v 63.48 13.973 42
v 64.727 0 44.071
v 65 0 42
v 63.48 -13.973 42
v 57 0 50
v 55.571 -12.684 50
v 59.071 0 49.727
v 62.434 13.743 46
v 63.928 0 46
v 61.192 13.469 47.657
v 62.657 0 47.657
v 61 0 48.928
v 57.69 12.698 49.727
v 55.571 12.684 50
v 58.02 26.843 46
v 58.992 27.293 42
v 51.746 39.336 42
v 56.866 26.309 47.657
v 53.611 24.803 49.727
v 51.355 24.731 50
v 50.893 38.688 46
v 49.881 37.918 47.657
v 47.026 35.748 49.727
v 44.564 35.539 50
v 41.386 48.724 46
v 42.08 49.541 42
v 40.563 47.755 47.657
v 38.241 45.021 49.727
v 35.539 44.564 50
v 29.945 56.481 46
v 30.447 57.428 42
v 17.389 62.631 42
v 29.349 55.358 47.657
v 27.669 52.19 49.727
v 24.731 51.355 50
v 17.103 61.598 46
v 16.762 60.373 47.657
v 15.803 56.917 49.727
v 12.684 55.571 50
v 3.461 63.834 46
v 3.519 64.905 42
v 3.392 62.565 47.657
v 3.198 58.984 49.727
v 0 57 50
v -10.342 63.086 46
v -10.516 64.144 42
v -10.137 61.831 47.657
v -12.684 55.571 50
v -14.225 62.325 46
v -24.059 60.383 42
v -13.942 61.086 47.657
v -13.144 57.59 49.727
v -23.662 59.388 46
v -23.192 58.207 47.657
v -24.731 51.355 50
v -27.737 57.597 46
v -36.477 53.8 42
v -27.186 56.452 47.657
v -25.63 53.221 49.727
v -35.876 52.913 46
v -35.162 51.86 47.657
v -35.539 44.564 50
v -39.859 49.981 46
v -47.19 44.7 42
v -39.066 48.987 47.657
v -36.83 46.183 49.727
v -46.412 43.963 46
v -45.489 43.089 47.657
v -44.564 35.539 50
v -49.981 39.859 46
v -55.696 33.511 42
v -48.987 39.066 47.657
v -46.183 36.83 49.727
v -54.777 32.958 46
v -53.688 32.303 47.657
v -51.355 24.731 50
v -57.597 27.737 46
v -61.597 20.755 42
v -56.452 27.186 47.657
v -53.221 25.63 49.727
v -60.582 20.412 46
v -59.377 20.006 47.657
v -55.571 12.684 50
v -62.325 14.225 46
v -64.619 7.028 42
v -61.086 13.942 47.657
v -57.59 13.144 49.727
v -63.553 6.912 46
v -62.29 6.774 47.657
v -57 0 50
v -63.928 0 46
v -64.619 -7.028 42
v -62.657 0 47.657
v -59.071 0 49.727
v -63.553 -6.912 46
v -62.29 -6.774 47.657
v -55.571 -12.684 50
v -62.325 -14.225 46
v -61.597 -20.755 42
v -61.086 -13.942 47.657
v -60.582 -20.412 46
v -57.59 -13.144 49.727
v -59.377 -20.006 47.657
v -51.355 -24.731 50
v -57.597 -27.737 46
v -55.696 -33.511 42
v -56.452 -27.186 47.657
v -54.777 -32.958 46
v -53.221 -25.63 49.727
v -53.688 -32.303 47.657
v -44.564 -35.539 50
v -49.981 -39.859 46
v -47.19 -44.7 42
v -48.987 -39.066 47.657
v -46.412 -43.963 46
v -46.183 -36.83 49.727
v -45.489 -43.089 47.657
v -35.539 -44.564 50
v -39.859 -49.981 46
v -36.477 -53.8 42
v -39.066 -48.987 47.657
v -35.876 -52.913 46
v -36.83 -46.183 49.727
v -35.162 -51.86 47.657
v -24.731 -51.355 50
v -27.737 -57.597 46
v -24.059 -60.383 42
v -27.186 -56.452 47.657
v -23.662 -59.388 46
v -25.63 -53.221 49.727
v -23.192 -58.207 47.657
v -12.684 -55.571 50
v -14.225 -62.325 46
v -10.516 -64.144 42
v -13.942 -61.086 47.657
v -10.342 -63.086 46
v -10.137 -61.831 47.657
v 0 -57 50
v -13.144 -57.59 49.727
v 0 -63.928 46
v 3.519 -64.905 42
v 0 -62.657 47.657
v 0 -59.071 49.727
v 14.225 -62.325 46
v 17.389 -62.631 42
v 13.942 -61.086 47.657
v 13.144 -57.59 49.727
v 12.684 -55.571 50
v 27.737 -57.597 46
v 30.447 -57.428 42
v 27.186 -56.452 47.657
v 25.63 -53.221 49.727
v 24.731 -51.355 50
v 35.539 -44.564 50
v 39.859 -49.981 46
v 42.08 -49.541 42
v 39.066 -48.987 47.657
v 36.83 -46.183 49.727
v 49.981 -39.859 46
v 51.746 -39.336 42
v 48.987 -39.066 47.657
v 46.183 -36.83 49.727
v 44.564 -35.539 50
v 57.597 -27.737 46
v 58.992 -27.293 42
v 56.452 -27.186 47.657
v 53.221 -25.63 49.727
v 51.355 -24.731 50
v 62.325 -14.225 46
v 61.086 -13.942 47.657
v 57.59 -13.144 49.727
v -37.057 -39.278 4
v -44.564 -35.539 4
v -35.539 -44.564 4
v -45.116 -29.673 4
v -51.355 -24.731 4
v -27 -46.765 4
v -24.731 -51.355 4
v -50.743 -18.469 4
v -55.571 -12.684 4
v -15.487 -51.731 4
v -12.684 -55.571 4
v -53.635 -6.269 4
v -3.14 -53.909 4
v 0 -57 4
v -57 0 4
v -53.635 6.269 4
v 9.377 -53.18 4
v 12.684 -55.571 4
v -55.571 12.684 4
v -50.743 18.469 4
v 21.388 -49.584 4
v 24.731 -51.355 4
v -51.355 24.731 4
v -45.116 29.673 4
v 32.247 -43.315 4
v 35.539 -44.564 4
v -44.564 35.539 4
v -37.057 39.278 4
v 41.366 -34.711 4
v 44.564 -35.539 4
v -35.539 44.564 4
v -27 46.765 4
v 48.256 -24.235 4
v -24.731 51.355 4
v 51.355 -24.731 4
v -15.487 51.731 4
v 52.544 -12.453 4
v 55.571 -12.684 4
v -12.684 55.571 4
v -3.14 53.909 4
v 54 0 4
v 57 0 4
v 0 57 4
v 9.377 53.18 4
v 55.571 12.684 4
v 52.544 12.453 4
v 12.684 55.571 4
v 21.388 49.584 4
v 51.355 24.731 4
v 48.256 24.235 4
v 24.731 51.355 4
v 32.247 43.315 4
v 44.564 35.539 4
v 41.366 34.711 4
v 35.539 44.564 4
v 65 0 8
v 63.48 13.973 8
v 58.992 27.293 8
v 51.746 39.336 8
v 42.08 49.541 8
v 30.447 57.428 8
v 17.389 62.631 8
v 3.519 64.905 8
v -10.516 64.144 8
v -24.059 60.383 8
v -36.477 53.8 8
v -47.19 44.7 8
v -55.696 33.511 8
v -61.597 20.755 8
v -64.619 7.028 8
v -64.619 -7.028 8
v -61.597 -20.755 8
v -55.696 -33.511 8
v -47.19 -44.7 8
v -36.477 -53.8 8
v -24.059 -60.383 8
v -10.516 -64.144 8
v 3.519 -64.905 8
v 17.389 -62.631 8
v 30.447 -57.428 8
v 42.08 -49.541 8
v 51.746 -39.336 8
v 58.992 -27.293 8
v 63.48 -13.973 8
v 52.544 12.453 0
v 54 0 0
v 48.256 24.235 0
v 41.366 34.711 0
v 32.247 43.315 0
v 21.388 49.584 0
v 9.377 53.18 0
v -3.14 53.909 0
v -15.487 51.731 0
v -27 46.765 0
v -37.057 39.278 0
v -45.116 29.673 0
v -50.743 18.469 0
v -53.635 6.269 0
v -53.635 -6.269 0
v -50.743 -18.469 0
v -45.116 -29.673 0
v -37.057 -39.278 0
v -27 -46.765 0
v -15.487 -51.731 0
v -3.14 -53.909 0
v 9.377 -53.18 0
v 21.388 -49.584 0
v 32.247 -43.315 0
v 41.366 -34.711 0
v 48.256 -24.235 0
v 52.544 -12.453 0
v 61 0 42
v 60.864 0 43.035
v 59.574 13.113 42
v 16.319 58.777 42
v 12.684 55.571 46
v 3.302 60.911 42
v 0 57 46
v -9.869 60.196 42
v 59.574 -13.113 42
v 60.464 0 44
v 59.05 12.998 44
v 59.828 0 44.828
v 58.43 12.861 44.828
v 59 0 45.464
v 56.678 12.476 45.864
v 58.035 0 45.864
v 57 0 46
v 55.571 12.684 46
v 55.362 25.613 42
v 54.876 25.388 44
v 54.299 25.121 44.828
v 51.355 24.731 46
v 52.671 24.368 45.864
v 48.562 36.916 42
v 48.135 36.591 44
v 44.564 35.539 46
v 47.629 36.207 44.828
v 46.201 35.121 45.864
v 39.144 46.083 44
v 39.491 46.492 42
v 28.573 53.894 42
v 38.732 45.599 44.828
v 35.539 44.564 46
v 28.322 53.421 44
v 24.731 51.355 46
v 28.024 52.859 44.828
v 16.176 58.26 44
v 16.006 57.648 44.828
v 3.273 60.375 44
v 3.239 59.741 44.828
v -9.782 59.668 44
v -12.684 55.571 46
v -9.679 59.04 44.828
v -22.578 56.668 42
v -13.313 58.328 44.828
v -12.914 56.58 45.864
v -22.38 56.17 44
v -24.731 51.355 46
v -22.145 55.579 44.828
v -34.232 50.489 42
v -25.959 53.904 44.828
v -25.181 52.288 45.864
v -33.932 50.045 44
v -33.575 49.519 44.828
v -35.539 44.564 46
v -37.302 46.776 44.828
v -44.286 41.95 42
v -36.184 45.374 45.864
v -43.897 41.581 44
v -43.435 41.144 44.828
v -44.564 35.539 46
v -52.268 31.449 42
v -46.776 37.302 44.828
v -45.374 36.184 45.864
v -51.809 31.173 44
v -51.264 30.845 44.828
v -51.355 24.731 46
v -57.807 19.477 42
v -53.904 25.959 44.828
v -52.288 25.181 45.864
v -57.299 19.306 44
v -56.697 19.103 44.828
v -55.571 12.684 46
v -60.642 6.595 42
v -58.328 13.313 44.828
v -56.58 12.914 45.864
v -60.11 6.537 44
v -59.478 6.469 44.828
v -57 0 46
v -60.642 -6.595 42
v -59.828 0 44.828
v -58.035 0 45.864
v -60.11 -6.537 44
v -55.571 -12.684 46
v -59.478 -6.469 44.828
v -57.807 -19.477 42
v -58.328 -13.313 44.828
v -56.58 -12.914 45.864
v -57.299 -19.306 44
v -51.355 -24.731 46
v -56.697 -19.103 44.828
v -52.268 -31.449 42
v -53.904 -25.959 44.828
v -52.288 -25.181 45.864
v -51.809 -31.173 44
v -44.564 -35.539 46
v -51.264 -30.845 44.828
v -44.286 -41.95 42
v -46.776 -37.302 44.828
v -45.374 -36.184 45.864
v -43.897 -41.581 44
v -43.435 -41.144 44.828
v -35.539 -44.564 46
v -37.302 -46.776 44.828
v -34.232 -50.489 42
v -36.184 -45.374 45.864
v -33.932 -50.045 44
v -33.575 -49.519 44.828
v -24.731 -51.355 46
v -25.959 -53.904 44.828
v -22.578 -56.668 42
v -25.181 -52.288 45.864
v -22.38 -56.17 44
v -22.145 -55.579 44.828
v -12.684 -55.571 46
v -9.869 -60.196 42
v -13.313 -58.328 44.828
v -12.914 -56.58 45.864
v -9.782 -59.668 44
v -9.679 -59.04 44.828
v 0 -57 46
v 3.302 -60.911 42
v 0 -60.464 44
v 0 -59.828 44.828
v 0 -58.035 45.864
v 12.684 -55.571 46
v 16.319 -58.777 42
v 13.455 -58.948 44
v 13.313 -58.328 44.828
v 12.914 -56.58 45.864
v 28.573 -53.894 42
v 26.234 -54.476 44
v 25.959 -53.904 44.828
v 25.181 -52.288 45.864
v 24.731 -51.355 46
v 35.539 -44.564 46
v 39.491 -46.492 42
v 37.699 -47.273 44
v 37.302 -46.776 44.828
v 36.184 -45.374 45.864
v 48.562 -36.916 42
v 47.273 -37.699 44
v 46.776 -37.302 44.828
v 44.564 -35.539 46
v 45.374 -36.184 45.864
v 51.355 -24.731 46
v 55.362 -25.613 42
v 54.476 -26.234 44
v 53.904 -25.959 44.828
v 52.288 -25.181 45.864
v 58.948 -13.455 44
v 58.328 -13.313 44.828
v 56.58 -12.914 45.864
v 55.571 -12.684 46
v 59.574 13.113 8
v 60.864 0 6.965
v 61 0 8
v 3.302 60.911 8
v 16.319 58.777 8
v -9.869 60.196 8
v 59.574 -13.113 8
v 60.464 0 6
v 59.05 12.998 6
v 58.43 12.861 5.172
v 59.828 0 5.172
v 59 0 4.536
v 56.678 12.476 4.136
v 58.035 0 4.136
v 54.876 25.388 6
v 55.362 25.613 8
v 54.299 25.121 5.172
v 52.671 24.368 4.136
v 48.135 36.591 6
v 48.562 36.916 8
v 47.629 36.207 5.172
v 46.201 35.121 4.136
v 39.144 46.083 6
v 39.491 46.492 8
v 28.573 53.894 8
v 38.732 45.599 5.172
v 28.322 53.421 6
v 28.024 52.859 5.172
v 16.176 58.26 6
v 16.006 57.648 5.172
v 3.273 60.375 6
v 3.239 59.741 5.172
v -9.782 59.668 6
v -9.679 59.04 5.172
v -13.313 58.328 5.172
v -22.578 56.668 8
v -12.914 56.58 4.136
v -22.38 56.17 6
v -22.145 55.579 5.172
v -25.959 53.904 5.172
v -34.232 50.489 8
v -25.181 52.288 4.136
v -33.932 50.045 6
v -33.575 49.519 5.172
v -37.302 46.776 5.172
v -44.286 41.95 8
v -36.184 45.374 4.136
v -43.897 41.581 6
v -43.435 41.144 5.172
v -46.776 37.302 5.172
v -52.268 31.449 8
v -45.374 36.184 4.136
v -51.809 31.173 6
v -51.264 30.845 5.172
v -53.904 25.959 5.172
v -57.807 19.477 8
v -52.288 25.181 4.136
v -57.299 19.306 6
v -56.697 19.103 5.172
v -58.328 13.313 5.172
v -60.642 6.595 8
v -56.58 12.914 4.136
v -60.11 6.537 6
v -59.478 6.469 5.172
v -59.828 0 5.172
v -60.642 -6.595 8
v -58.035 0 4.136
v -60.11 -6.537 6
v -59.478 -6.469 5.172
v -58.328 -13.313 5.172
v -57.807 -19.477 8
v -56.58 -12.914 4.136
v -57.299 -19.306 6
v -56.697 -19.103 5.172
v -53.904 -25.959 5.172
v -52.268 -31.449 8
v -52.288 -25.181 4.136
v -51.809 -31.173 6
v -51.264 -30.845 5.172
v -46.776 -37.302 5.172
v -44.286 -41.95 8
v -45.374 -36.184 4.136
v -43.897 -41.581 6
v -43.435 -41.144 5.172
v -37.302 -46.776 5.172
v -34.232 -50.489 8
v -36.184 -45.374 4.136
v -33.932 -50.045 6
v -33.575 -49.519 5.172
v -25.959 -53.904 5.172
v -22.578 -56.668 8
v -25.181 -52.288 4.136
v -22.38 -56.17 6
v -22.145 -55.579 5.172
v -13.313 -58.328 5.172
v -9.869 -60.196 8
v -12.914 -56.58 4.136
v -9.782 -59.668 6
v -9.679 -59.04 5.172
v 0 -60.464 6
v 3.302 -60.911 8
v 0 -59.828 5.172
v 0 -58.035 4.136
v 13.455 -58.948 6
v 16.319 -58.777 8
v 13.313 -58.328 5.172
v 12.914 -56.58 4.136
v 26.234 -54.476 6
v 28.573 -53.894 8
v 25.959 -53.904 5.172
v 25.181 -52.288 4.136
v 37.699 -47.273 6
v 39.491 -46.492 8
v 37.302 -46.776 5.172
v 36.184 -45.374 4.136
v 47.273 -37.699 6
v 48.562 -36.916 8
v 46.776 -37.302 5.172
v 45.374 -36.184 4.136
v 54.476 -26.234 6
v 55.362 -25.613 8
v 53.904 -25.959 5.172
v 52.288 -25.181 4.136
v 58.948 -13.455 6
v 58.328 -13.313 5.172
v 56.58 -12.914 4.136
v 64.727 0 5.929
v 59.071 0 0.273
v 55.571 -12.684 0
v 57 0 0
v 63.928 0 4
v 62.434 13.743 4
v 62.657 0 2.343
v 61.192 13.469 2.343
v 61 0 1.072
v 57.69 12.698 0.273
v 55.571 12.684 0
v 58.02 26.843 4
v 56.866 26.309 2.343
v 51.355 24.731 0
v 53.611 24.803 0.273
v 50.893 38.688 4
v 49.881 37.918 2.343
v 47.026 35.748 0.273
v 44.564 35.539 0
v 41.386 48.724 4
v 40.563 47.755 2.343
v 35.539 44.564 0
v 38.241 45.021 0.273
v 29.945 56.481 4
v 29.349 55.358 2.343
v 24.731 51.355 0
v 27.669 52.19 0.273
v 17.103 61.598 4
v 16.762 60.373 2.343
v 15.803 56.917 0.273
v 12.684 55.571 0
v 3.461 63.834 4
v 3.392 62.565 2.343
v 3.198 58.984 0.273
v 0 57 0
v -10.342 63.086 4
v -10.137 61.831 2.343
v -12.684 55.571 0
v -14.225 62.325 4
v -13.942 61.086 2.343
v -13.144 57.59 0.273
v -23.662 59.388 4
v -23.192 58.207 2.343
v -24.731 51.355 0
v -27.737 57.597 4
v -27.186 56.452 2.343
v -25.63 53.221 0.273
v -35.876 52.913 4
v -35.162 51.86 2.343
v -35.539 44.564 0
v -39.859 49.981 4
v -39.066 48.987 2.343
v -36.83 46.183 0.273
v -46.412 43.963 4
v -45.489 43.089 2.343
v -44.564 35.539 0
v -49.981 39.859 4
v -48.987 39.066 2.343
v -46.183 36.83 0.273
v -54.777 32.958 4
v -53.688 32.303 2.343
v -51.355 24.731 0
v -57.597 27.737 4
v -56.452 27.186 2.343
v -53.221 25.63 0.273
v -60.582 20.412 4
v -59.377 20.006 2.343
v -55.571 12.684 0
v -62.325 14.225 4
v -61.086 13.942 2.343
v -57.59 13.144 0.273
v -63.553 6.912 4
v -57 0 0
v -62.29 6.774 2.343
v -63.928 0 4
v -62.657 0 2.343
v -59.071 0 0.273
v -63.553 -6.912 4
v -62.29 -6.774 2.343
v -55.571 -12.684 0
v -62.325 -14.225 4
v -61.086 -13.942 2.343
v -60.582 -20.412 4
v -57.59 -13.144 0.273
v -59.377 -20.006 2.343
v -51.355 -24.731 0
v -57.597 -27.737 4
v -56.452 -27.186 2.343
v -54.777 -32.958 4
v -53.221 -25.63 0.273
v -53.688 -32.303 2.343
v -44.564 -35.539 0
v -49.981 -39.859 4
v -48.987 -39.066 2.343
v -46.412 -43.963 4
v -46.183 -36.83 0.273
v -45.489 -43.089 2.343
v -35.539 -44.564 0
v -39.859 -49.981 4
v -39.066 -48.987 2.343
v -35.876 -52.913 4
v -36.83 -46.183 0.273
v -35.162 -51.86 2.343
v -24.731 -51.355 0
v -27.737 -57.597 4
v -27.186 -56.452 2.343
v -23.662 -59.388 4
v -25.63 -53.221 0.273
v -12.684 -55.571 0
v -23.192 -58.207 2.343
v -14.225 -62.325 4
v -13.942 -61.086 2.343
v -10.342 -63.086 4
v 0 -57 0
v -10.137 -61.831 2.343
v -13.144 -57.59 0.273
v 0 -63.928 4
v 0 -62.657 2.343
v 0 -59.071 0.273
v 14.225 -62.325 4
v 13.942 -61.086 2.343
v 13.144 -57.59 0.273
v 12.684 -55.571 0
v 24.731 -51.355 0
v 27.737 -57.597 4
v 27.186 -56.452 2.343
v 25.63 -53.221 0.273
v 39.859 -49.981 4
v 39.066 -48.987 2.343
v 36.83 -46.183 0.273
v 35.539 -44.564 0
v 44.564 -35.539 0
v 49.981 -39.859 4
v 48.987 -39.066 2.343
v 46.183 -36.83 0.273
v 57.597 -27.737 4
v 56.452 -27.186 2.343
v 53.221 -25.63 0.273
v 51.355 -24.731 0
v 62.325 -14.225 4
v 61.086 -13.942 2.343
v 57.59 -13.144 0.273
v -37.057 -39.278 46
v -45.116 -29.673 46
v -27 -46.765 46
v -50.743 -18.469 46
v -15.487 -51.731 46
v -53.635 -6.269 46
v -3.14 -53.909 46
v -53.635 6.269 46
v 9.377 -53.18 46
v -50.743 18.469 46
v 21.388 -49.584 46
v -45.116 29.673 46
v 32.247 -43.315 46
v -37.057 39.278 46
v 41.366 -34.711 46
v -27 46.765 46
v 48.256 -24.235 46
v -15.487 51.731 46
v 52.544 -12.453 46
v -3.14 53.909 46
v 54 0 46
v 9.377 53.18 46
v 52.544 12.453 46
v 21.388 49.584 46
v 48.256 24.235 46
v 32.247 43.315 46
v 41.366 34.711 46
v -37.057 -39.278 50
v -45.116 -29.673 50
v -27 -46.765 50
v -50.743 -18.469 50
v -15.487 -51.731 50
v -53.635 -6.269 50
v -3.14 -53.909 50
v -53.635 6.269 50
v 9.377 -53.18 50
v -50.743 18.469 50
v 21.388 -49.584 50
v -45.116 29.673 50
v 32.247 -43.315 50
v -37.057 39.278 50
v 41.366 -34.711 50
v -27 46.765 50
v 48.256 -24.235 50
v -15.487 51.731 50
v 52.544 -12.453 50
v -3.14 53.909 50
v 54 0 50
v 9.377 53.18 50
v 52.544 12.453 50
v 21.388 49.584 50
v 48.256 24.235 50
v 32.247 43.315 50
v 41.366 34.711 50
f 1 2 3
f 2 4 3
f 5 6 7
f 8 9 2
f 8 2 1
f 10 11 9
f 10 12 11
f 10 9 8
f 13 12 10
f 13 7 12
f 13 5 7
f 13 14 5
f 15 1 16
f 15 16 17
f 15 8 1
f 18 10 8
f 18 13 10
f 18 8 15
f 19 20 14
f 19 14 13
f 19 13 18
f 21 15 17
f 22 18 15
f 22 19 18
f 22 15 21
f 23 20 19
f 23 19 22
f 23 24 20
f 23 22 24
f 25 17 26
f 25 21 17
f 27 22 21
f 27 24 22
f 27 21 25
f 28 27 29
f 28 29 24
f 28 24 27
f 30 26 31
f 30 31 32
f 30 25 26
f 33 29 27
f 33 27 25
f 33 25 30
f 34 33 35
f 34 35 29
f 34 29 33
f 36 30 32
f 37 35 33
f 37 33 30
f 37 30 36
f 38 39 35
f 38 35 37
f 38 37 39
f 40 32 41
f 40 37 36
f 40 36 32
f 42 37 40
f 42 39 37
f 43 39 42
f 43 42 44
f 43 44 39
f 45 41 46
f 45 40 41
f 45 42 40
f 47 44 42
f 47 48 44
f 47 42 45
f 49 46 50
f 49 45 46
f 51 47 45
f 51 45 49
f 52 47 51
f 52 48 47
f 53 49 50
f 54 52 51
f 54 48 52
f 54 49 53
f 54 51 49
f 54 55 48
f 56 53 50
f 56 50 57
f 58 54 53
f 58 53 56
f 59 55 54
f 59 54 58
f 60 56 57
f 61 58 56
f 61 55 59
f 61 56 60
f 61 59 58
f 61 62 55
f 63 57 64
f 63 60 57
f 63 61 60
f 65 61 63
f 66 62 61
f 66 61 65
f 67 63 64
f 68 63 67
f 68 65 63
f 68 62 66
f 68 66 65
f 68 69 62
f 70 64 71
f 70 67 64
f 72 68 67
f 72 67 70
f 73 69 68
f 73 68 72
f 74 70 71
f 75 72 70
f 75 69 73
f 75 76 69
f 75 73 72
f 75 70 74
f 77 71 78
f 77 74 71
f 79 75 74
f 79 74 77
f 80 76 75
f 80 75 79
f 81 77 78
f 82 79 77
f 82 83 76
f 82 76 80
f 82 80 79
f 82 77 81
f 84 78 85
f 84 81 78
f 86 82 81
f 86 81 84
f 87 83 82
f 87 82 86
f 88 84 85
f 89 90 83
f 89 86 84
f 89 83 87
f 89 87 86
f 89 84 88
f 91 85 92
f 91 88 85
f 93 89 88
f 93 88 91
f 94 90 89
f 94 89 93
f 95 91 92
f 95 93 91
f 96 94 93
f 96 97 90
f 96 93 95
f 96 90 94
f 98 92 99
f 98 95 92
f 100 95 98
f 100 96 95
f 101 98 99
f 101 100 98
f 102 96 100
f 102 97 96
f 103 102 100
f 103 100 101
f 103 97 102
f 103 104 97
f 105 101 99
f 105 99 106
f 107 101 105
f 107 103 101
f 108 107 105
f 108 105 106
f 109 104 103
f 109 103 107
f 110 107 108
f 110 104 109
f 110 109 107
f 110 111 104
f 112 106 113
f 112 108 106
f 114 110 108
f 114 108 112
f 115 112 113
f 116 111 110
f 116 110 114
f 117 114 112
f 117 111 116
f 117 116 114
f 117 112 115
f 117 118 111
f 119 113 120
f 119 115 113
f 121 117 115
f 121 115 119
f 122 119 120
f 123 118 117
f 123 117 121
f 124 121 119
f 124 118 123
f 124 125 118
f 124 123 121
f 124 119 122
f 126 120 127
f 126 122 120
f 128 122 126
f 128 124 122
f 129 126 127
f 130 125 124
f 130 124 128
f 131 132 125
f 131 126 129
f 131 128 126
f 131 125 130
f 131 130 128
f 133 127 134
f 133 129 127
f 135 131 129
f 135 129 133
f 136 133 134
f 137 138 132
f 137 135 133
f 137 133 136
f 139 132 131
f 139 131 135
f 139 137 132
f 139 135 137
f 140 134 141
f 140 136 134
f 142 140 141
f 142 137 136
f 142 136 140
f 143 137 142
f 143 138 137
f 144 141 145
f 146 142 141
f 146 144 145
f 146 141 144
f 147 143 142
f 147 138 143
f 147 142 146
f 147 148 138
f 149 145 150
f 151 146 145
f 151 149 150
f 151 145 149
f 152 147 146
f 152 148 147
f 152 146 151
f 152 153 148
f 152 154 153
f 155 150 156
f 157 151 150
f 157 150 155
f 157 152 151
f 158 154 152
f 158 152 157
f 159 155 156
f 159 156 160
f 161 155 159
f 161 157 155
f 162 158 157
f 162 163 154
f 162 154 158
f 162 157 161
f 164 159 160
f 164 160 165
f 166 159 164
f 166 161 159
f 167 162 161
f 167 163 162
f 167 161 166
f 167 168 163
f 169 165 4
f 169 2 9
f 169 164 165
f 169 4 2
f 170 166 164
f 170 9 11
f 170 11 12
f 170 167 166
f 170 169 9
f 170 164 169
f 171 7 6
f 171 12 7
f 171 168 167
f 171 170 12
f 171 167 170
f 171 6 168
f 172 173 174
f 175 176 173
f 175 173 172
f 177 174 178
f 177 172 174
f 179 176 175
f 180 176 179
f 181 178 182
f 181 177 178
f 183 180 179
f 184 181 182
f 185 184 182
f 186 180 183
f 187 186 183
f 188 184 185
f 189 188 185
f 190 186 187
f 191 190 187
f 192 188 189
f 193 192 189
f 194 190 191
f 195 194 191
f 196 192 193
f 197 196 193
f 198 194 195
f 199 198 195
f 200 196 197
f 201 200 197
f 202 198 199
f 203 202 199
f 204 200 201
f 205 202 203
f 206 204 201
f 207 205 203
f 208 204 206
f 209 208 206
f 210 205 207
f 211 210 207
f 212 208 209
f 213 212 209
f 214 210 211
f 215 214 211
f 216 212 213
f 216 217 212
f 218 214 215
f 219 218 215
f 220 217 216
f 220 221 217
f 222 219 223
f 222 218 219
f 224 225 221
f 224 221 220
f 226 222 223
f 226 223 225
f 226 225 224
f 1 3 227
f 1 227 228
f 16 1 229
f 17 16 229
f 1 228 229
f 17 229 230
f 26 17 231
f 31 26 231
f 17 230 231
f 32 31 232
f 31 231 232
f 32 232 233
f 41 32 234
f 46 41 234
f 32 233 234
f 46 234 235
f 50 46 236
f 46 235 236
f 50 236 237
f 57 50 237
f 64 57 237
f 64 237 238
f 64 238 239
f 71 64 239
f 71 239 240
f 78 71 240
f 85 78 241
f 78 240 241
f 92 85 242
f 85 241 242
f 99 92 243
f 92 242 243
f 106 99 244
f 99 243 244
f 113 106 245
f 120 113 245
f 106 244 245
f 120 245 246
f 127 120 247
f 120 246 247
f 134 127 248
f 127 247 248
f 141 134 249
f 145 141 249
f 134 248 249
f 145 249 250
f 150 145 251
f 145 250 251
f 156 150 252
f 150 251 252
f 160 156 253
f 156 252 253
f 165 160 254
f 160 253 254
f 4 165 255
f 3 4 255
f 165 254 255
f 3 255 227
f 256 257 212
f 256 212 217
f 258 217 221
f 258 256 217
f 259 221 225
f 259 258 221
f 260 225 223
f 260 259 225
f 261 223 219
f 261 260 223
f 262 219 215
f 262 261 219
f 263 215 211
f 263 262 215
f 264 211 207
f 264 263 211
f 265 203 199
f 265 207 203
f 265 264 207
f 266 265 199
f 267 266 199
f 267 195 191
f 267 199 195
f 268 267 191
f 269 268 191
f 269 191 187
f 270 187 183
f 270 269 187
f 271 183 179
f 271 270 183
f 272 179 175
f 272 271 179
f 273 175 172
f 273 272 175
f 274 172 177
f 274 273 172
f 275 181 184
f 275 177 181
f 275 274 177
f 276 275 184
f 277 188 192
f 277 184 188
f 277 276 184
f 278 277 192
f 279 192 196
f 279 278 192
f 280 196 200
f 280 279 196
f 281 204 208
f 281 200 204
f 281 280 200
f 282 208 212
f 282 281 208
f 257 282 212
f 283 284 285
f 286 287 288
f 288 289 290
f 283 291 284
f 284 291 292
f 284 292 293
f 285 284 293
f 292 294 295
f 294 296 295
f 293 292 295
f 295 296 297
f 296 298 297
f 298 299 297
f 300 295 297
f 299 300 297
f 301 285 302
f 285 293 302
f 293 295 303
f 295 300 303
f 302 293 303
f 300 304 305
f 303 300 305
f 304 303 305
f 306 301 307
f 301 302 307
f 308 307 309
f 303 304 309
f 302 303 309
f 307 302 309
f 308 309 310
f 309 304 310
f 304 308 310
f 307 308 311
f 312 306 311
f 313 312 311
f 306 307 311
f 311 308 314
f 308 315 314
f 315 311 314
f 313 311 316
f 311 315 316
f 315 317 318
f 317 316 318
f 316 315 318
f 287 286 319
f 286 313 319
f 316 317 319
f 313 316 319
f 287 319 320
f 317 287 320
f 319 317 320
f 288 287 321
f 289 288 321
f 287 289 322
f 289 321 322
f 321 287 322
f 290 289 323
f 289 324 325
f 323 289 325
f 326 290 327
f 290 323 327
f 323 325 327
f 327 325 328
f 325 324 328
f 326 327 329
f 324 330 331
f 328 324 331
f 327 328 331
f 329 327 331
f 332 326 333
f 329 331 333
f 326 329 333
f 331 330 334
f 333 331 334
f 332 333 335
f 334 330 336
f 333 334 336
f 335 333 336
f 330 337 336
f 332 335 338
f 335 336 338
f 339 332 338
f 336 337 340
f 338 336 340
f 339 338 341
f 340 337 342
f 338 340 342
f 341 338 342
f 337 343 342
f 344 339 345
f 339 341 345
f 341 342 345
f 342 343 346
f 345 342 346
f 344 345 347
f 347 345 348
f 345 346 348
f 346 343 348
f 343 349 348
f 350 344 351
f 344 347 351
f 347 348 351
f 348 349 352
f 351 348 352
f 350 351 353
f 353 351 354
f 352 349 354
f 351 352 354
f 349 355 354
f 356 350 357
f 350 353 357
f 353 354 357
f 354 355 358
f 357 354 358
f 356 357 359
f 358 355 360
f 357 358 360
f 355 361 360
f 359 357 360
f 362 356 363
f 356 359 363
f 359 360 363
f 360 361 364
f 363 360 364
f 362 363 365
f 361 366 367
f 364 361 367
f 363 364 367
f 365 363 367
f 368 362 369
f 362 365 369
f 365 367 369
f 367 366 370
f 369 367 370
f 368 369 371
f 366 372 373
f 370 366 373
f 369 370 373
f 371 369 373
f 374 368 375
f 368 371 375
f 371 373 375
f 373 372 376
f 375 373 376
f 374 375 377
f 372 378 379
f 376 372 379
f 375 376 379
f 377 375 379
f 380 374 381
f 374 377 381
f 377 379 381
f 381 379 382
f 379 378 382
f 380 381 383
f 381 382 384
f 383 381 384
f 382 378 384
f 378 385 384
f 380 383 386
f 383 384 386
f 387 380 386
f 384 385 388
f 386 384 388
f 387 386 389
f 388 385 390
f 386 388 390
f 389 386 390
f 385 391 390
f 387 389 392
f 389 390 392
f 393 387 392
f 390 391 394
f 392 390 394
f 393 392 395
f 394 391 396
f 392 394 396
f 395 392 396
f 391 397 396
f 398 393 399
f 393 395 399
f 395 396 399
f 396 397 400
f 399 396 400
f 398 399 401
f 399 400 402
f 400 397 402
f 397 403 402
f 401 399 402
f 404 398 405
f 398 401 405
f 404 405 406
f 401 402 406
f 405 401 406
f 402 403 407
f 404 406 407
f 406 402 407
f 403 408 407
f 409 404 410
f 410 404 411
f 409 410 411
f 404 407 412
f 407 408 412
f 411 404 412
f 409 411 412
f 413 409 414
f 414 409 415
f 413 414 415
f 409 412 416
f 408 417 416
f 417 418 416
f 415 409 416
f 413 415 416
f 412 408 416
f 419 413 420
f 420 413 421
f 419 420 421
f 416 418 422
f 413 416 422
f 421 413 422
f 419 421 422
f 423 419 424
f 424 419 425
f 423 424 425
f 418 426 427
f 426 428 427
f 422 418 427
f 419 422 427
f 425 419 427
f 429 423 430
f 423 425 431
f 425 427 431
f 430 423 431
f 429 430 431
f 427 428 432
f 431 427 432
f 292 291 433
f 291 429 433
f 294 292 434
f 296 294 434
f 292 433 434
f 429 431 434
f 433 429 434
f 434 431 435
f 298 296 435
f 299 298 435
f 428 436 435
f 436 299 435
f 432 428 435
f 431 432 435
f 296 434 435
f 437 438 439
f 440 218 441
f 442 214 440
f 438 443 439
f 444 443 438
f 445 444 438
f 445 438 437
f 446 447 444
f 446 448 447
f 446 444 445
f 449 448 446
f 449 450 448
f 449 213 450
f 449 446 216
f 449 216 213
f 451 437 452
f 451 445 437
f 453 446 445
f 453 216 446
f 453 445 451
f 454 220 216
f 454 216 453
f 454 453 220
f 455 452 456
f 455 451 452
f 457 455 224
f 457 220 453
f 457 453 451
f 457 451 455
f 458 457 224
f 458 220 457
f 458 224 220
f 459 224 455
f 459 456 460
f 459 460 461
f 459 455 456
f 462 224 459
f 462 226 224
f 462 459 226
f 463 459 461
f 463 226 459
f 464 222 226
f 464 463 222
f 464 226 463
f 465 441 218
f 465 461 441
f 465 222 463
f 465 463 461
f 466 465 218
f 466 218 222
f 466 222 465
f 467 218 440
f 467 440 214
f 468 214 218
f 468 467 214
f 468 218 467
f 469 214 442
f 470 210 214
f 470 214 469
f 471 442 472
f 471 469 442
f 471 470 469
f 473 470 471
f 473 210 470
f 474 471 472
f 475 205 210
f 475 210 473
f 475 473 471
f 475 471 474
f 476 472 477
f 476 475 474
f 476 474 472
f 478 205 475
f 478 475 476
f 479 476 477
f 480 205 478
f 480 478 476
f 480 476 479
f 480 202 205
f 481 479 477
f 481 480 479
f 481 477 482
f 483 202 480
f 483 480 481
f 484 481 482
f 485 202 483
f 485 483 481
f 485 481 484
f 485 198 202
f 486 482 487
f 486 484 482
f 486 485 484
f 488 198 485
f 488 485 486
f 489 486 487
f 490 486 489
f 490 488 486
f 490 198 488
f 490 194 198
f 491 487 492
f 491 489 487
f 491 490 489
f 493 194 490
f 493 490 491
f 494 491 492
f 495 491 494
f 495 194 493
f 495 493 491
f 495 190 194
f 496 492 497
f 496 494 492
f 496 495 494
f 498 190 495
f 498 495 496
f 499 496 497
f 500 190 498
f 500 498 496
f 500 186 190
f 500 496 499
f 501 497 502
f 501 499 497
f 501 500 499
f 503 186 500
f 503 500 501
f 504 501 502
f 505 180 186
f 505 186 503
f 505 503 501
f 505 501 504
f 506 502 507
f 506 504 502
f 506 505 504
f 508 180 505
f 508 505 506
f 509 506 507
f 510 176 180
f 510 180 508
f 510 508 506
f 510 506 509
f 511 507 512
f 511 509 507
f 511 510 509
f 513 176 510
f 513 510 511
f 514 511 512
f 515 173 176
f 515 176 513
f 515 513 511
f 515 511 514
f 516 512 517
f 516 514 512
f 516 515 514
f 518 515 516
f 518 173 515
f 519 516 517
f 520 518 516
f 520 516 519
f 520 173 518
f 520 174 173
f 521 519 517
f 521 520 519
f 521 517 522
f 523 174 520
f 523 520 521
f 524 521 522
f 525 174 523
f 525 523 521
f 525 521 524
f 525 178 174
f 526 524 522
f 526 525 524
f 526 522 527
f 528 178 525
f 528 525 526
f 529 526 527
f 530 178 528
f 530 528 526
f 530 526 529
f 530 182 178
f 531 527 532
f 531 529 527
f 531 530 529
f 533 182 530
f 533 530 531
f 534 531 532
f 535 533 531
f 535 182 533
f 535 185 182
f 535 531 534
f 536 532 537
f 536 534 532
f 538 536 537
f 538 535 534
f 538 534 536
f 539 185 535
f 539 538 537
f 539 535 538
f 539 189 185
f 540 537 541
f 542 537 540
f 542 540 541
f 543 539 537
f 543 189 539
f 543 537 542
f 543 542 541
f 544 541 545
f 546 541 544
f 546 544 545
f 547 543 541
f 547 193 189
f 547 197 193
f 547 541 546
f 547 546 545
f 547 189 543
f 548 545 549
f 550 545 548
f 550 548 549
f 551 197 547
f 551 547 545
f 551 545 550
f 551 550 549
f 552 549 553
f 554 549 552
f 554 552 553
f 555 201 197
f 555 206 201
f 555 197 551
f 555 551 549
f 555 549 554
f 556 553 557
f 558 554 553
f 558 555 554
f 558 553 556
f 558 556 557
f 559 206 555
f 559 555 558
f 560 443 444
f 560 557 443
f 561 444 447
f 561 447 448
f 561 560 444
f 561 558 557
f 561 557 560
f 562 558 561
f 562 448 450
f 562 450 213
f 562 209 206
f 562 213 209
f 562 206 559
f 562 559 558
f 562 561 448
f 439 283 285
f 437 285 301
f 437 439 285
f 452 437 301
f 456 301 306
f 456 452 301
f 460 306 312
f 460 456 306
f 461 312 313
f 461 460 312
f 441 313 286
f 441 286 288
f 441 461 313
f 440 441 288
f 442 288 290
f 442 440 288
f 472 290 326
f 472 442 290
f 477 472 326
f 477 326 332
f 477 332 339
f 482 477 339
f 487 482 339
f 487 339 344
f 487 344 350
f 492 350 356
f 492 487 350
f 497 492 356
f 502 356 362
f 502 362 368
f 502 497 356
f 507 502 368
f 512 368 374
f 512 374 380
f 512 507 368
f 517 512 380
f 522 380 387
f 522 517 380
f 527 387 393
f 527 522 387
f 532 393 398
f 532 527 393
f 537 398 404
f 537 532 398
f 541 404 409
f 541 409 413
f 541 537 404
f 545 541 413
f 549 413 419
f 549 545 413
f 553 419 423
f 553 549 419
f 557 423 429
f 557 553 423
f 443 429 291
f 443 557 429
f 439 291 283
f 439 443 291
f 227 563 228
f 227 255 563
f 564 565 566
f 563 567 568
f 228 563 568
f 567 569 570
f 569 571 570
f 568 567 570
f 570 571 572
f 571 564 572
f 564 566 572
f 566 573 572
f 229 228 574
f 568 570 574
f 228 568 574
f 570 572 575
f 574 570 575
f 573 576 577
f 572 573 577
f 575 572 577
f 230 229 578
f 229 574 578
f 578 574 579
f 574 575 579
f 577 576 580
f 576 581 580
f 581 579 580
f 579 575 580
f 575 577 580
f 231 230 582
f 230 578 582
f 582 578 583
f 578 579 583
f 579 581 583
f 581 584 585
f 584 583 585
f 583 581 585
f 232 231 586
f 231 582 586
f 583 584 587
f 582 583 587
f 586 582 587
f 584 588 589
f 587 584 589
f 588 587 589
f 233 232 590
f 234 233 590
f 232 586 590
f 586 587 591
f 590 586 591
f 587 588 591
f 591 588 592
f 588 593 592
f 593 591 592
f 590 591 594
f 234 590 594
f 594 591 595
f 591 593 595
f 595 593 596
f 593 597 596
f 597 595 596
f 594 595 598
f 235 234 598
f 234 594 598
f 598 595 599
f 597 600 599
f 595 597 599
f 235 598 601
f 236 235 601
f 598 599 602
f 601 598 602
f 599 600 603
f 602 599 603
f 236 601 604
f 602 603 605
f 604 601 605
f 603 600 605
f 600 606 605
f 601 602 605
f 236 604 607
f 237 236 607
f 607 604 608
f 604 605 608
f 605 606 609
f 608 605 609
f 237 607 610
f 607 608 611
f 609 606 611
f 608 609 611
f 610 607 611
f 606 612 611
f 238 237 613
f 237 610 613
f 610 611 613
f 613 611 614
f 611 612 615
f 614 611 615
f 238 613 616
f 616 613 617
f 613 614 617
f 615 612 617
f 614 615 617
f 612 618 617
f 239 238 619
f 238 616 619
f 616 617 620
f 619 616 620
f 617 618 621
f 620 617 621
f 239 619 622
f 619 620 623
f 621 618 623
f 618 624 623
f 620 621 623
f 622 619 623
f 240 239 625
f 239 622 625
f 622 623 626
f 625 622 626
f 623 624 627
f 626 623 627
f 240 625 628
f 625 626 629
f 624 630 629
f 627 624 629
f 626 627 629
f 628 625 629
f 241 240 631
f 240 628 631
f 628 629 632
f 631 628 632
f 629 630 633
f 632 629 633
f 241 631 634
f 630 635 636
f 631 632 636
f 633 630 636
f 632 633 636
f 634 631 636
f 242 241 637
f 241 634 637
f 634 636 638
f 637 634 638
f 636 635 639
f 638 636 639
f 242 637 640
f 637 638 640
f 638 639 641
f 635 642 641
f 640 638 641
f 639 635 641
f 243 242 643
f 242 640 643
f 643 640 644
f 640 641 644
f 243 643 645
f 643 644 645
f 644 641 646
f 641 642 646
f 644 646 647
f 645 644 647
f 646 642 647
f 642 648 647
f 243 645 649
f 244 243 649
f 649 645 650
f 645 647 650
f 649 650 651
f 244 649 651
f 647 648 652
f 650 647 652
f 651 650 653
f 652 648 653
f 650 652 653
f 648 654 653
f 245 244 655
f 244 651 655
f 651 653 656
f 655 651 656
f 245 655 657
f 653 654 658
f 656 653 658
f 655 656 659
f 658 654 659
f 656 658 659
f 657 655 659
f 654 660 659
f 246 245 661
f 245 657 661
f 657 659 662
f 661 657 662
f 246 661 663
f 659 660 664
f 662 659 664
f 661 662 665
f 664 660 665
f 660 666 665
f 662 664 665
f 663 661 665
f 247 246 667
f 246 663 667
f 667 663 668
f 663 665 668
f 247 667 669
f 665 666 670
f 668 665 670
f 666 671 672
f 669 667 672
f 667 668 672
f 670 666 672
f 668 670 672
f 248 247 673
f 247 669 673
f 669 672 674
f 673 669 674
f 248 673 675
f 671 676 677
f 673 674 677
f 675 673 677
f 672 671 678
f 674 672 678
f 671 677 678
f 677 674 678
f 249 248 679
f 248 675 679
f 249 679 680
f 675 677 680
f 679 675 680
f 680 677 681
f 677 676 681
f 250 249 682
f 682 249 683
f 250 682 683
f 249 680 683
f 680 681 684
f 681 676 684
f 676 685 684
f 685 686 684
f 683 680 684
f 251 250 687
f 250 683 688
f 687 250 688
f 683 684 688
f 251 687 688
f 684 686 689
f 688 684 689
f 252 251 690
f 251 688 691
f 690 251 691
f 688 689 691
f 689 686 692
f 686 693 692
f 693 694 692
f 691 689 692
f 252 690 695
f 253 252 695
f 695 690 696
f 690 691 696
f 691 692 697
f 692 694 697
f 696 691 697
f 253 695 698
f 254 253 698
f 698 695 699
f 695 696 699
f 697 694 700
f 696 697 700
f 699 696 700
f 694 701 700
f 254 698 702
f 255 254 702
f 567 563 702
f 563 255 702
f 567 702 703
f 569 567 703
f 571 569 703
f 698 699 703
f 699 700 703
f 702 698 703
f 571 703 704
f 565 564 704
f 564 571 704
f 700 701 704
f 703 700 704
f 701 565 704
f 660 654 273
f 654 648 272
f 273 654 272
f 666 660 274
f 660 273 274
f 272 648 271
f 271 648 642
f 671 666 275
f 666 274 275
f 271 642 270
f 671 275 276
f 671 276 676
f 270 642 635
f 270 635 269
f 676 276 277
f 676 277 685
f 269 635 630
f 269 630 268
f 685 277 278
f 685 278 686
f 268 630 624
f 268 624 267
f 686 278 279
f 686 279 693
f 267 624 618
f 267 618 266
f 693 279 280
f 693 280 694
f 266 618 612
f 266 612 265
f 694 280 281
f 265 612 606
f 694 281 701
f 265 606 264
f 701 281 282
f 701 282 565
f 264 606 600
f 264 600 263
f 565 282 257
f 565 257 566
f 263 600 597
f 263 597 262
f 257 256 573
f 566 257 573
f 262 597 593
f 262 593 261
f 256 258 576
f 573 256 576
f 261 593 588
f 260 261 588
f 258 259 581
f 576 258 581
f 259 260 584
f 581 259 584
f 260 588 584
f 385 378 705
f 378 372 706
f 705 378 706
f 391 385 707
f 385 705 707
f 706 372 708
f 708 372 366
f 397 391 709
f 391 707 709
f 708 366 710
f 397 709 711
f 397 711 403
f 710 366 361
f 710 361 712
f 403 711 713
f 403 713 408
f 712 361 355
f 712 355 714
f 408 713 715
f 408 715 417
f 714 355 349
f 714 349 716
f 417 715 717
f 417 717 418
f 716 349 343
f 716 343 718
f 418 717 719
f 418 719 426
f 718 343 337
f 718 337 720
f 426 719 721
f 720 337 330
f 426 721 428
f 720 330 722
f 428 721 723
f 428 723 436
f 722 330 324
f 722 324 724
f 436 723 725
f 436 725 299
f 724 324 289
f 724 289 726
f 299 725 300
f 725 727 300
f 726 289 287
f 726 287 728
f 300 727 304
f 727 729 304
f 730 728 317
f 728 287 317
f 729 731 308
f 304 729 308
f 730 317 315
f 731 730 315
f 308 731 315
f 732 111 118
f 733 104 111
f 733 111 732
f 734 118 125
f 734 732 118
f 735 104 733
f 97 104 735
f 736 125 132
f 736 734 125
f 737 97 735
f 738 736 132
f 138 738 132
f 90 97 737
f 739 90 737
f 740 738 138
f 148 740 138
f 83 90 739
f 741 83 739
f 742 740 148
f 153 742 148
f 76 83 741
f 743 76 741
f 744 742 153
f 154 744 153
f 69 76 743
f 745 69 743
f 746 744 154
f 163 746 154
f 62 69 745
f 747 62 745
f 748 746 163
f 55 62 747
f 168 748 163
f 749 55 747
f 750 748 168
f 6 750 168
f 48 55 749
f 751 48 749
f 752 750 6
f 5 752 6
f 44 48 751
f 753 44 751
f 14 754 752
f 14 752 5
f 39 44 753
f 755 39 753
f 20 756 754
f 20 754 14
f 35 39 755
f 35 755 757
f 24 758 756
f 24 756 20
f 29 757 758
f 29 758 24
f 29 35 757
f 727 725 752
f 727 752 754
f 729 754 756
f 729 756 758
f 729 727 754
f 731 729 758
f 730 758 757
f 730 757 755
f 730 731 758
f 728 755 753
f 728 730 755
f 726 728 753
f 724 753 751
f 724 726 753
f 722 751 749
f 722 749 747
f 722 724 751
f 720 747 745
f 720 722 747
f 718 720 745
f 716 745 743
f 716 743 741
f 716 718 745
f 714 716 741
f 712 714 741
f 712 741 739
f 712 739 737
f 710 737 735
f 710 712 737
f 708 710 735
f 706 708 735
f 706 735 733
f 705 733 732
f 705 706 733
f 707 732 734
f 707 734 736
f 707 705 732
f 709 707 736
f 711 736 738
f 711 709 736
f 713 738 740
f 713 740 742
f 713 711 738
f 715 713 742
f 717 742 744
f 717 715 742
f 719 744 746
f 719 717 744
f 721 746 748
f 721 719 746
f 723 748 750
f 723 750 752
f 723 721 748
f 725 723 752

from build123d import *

# Parameters (mm, degrees)
SKETCH_1_R      = 65
SKETCH_1_R_2    = 54
EXTRUDE_1_DEPTH = 50
FILLET_1_R      = 8
SHELL_1_T       = -4


with BuildPart() as part:
    # Эскиз1 → Вытянуть-Тонкостенный1 (new body)
    with BuildSketch(Plane.XY):
        Circle(SKETCH_1_R)
        Circle(SKETCH_1_R_2, mode=Mode.SUBTRACT)
    extrude(amount=EXTRUDE_1_DEPTH)

    # Скругление1
    fillet_1_edges = [part.edges().sort_by_distance(p)[0] for p in [
        (-65, 0, 0),
        (-65, 0, 50),
    ]]
    fillet(fillet_1_edges, radius=FILLET_1_R)

    # Оболочка1
    shell_1_openings = [part.faces().sort_by_distance(p)[0] for p in [
        (-54, 0, 25),
    ]]
    offset(amount=SHELL_1_T, openings=shell_1_openings, kind=Kind.INTERSECTION)


solid = part.part
